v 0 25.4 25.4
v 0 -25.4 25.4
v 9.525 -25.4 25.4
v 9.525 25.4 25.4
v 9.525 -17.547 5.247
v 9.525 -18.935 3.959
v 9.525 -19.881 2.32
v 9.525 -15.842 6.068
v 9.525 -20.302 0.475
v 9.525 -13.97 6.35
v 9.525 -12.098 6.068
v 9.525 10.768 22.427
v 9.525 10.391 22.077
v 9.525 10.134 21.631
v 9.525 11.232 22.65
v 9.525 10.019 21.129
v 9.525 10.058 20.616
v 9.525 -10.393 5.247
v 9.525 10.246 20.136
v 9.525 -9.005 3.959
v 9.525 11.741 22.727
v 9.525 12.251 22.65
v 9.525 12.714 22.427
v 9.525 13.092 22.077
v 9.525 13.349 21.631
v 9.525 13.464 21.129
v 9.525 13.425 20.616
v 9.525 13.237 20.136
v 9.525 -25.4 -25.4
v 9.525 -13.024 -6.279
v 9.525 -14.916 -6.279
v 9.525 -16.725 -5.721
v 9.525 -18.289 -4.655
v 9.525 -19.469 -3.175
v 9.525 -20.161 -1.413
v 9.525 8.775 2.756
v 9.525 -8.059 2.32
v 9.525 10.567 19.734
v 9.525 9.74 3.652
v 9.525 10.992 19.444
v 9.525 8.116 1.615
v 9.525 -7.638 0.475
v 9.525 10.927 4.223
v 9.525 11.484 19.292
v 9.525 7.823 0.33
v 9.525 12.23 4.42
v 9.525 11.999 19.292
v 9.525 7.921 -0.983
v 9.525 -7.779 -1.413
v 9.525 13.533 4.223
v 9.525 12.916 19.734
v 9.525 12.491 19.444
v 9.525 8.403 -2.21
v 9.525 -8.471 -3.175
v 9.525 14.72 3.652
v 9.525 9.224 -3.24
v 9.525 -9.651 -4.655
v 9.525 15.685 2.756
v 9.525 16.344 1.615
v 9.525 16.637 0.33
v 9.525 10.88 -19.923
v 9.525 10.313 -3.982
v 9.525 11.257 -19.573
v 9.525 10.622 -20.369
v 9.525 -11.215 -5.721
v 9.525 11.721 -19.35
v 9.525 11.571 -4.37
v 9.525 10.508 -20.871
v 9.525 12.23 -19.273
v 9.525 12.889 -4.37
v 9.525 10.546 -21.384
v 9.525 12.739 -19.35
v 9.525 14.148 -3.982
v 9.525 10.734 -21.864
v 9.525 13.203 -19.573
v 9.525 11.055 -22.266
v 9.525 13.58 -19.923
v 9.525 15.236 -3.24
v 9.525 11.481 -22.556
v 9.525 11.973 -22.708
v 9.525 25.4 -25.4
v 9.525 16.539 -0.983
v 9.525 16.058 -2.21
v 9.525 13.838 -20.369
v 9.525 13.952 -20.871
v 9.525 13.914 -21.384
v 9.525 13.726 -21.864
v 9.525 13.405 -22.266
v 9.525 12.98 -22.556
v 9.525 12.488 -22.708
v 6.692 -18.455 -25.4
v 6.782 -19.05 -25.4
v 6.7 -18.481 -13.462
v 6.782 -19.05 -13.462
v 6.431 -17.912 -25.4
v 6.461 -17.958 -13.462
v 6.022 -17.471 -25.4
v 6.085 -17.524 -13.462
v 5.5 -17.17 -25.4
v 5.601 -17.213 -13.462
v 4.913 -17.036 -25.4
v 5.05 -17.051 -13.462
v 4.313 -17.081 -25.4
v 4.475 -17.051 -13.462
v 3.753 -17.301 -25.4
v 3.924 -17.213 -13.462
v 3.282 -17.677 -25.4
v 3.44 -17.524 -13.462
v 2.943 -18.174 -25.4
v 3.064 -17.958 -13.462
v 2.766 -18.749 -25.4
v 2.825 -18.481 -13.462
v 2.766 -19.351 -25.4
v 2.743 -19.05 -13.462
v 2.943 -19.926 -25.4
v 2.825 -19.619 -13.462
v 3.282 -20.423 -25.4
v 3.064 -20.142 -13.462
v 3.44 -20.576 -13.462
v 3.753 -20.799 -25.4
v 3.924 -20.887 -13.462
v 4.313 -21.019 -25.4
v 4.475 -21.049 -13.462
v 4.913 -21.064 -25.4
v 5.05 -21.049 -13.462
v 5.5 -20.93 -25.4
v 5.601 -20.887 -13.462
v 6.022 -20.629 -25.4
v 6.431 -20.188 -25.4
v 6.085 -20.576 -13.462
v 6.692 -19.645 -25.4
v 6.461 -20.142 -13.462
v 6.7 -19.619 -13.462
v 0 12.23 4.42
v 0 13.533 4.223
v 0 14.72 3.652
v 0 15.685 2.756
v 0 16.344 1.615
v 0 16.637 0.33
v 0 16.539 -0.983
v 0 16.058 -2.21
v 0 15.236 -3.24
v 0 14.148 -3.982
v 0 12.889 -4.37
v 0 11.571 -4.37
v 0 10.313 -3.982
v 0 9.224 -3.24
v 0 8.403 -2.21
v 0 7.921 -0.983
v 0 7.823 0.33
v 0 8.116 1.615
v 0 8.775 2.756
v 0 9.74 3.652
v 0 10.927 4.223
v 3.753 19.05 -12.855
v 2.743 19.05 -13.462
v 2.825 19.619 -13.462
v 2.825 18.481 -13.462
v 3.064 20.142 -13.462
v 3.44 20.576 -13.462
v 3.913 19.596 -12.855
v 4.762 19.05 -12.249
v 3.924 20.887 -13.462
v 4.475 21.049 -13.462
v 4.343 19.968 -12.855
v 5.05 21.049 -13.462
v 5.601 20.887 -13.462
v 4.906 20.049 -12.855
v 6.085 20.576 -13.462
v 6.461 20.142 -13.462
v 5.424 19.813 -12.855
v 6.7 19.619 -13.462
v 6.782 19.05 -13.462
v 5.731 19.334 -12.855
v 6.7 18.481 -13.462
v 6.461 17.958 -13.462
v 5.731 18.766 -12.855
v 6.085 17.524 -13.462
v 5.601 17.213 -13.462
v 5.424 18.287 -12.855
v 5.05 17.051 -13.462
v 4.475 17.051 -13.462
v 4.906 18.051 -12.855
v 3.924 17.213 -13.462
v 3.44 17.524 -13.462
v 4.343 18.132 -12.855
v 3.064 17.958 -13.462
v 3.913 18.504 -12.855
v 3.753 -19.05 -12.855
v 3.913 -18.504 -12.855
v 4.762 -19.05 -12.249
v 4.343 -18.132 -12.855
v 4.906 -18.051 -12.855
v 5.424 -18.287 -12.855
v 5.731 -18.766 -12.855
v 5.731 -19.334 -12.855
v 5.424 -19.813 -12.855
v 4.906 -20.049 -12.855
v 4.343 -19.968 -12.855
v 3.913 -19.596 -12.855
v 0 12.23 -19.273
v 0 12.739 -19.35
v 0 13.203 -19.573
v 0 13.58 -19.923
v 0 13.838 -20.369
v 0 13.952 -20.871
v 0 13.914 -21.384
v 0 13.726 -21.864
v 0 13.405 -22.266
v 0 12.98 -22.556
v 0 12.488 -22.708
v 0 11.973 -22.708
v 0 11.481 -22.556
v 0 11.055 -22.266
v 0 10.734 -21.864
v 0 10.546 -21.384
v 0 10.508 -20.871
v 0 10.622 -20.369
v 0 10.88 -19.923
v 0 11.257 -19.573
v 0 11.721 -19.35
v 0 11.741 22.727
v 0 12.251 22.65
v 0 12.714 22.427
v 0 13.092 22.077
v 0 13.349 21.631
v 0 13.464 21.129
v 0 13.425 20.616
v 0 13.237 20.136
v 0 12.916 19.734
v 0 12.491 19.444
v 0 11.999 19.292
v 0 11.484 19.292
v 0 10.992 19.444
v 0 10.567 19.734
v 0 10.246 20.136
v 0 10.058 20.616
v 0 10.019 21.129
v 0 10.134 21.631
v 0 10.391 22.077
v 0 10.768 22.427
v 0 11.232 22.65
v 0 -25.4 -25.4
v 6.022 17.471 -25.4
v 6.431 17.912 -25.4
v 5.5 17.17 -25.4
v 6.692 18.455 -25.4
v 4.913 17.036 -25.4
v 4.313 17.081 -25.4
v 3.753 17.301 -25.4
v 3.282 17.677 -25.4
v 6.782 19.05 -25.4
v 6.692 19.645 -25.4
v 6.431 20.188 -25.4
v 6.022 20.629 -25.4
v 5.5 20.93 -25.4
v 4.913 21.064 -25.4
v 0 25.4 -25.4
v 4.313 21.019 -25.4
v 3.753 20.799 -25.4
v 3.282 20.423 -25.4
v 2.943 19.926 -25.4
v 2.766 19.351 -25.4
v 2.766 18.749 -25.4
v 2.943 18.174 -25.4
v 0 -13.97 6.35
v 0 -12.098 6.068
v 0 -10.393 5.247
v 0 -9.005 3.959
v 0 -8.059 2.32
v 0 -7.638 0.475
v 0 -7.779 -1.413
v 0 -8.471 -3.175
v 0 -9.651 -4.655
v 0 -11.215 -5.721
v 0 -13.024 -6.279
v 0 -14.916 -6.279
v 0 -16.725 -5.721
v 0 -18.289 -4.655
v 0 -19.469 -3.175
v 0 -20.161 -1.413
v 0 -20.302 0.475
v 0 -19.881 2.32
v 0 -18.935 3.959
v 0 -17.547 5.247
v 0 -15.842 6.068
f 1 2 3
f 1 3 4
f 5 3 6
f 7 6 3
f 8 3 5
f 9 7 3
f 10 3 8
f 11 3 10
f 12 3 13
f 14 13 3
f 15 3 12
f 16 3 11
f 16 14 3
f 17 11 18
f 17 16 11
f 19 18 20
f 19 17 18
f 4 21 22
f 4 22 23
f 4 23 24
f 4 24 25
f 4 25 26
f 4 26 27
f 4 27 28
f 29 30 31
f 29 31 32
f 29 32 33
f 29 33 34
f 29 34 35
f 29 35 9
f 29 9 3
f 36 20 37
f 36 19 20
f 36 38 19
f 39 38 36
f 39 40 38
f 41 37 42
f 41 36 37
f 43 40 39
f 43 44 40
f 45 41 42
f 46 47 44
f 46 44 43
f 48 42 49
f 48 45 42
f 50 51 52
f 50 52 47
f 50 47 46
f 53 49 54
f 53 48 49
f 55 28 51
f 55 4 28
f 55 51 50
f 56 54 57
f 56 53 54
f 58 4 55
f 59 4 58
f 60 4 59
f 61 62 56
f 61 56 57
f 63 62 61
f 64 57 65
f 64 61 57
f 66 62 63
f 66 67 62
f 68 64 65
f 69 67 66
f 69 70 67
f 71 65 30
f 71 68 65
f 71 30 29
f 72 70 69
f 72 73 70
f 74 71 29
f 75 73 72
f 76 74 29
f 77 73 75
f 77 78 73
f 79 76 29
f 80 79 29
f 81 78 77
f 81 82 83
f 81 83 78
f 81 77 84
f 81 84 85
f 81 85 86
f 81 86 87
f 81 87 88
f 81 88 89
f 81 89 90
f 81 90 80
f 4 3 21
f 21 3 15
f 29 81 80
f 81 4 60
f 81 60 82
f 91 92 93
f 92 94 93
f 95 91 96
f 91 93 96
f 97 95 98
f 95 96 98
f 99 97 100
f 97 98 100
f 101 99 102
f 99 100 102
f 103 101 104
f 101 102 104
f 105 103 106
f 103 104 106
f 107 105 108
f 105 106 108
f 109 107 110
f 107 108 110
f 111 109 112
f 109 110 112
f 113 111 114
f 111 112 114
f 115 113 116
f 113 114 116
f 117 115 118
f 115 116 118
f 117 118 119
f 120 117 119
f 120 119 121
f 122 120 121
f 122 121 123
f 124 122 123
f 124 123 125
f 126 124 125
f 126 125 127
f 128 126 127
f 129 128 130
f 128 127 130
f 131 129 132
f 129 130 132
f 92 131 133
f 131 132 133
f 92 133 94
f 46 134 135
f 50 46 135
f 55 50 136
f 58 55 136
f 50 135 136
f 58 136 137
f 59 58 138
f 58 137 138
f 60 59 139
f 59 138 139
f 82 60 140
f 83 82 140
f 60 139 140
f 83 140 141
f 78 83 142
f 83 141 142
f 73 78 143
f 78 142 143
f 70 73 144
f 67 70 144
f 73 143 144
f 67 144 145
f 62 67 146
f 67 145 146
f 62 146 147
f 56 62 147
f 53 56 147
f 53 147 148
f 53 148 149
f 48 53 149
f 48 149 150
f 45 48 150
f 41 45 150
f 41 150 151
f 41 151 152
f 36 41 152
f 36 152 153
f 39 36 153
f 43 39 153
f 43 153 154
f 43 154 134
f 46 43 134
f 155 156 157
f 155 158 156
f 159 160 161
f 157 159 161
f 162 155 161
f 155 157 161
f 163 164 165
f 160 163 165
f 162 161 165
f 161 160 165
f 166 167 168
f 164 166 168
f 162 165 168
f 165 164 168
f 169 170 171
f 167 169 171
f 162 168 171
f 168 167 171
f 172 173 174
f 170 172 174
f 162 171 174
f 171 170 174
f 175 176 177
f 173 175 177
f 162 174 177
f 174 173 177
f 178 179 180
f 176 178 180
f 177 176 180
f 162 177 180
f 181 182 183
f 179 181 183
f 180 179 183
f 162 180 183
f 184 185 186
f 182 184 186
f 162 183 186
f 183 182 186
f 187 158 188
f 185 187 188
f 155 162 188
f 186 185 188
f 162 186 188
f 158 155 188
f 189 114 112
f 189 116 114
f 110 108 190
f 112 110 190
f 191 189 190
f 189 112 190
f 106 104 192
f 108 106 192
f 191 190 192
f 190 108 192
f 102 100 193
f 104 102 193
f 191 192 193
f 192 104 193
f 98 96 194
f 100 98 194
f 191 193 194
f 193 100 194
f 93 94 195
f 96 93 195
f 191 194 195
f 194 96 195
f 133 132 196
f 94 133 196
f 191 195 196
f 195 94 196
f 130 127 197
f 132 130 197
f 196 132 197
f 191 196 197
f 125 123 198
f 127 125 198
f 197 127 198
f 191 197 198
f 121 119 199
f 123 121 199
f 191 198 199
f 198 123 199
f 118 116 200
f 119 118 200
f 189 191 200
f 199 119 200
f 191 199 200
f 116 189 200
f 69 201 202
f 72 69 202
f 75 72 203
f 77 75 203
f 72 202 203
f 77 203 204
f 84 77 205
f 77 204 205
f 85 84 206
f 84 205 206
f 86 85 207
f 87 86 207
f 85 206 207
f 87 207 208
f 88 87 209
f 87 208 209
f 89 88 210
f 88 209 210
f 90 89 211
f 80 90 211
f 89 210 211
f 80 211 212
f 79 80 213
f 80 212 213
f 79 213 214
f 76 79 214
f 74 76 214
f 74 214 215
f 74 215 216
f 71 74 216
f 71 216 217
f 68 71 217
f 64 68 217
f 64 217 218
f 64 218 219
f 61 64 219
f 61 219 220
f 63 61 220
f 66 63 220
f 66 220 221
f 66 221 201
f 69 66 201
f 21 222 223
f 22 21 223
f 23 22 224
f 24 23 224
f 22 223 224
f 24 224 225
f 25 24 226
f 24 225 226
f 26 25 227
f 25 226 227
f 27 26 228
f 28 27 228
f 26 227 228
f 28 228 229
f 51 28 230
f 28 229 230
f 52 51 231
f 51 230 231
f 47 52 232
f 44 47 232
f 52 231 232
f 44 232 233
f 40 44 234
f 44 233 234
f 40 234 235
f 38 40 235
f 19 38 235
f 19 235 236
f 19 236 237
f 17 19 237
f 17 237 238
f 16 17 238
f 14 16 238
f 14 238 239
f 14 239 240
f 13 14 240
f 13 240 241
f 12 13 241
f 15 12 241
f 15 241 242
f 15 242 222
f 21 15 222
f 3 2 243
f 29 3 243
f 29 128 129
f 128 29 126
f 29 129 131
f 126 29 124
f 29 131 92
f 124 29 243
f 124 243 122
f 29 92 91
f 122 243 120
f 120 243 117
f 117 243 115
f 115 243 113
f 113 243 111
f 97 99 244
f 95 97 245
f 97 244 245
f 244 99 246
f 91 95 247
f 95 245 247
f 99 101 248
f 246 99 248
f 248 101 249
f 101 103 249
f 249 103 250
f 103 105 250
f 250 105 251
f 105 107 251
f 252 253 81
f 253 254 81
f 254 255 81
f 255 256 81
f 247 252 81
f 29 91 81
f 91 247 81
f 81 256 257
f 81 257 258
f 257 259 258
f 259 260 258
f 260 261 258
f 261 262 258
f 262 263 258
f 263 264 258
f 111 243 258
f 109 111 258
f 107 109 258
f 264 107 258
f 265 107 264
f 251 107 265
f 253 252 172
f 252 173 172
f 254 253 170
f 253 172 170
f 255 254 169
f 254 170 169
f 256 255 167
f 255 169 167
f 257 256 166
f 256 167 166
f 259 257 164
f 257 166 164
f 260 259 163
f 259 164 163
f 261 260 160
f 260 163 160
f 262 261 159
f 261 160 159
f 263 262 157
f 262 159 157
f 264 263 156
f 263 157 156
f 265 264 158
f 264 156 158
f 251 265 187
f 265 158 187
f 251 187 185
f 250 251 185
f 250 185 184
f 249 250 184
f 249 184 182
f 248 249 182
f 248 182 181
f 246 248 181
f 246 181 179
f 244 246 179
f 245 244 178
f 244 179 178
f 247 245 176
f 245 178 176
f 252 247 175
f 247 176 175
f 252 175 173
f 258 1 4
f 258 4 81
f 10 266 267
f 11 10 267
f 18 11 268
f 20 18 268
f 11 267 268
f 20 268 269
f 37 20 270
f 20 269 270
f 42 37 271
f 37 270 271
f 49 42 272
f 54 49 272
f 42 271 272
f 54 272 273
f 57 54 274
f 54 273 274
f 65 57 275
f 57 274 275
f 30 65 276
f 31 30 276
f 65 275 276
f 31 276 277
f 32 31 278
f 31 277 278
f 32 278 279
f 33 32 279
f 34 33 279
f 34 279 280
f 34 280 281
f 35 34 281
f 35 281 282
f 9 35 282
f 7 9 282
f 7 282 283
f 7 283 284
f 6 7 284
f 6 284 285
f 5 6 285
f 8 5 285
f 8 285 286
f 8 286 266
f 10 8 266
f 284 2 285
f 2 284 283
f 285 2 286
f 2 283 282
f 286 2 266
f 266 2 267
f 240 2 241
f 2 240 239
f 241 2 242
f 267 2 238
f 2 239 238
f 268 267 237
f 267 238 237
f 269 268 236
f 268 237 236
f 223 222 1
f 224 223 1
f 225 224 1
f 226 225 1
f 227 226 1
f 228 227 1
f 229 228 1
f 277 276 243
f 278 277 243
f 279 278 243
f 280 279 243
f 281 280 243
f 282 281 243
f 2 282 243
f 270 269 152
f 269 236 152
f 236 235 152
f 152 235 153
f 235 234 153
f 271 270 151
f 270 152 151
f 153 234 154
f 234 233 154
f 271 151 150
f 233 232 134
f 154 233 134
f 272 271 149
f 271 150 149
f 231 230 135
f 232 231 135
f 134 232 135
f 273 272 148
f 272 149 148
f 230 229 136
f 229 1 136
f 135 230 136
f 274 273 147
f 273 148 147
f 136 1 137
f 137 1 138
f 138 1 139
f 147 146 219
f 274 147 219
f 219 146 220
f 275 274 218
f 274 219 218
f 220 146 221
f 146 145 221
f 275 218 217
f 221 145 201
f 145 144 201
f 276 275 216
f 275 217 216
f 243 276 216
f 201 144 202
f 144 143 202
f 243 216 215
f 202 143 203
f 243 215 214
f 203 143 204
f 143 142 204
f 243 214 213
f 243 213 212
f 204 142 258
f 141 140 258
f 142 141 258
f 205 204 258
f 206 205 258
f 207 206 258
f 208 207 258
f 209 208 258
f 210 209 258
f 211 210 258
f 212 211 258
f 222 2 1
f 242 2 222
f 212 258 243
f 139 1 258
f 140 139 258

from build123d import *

# Parameters (mm, degrees)
SKETCH1_W                       = 50.8
SKETCH1_H                       = 50.8
BOSS_EXTRUDE1_DEPTH             = 9.525
F_1_2_0_5_DIAMETER_HOLE1_D      = 12.7
F_1_2_0_5_DIAMETER_HOLE1_DEPTH  = 70.104
F_1_2_0_5_DIAMETER_HOLE1_TIP    = 3.815464931
S_0_348_DIAMETER_HOLE1_D        = 8.8392
S_0_348_DIAMETER_HOLE1_DEPTH    = 70.104
S_0_348_DIAMETER_HOLE1_TIP      = 2.655563592
F_29_0_136_DIAMETER_HOLE1_D     = 3.4544
F_29_0_136_DIAMETER_HOLE1_DEPTH = 70.104
F_29_0_136_DIAMETER_HOLE1_TIP   = 1.037806461
F_10_32_TAPPED_HOLE1_D          = 4.0386
F_10_32_TAPPED_HOLE1_DEPTH      = 11.938
F_10_32_TAPPED_HOLE1_TIP        = 1.213317848


with BuildPart() as part:
    # Sketch1 → Boss-Extrude1 (new body)
    with BuildSketch(Plane(origin=(0, 0, 0), x_dir=(0, 0, -1), z_dir=(1, 0, 0))):
        Rectangle(SKETCH1_W, SKETCH1_H)
    extrude(amount=BOSS_EXTRUDE1_DEPTH)

    # 1/2 (0.5) Diameter Hole1
    with Locations(Plane(origin=(9.525, 0, 0), x_dir=(0, 0, -1), z_dir=(1, 0, 0))):
        with Locations((0, -13.97)):
            Hole(F_1_2_0_5_DIAMETER_HOLE1_D / 2, depth=F_1_2_0_5_DIAMETER_HOLE1_DEPTH)
            with Locations((0, 0, -(F_1_2_0_5_DIAMETER_HOLE1_DEPTH + F_1_2_0_5_DIAMETER_HOLE1_TIP / 2))):  # 118° drill point
                Cone(0, F_1_2_0_5_DIAMETER_HOLE1_D / 2, F_1_2_0_5_DIAMETER_HOLE1_TIP, mode=Mode.SUBTRACT)

    # S (0.348) Diameter Hole1
    with Locations(Plane(origin=(9.525, 0, 0), x_dir=(0, 0, -1), z_dir=(1, 0, 0))):
        with Locations((0, 12.2301)):
            Hole(S_0_348_DIAMETER_HOLE1_D / 2, depth=S_0_348_DIAMETER_HOLE1_DEPTH)
            with Locations((0, 0, -(S_0_348_DIAMETER_HOLE1_DEPTH + S_0_348_DIAMETER_HOLE1_TIP / 2))):  # 118° drill point
                Cone(0, S_0_348_DIAMETER_HOLE1_D / 2, S_0_348_DIAMETER_HOLE1_TIP, mode=Mode.SUBTRACT)

    # #29 (0.136) Diameter Hole1
    with Locations(Plane(origin=(9.525, 0, 0), x_dir=(0, 0, -1), z_dir=(1, 0, 0))):
        with Locations((21, 12.2301), (-21, 11.74145915)):
            Hole(F_29_0_136_DIAMETER_HOLE1_D / 2, depth=F_29_0_136_DIAMETER_HOLE1_DEPTH)
            with Locations((0, 0, -(F_29_0_136_DIAMETER_HOLE1_DEPTH + F_29_0_136_DIAMETER_HOLE1_TIP / 2))):  # 118° drill point
                Cone(0, F_29_0_136_DIAMETER_HOLE1_D / 2, F_29_0_136_DIAMETER_HOLE1_TIP, mode=Mode.SUBTRACT)

    # #10-32 Tapped Hole1
    with Locations(Plane(origin=(-0.669296778, 7.980106856, -25.4), x_dir=(-1, 0, 0), z_dir=(0, 0, -1))):
        with Locations((-5.431796778, -27.030106856), (-5.431796778, 11.069893144)):
            Hole(F_10_32_TAPPED_HOLE1_D / 2, depth=F_10_32_TAPPED_HOLE1_DEPTH)
            with Locations((0, 0, -(F_10_32_TAPPED_HOLE1_DEPTH + F_10_32_TAPPED_HOLE1_TIP / 2))):  # 118° drill point
                Cone(0, F_10_32_TAPPED_HOLE1_D / 2, F_10_32_TAPPED_HOLE1_TIP, mode=Mode.SUBTRACT)


solid = part.part
